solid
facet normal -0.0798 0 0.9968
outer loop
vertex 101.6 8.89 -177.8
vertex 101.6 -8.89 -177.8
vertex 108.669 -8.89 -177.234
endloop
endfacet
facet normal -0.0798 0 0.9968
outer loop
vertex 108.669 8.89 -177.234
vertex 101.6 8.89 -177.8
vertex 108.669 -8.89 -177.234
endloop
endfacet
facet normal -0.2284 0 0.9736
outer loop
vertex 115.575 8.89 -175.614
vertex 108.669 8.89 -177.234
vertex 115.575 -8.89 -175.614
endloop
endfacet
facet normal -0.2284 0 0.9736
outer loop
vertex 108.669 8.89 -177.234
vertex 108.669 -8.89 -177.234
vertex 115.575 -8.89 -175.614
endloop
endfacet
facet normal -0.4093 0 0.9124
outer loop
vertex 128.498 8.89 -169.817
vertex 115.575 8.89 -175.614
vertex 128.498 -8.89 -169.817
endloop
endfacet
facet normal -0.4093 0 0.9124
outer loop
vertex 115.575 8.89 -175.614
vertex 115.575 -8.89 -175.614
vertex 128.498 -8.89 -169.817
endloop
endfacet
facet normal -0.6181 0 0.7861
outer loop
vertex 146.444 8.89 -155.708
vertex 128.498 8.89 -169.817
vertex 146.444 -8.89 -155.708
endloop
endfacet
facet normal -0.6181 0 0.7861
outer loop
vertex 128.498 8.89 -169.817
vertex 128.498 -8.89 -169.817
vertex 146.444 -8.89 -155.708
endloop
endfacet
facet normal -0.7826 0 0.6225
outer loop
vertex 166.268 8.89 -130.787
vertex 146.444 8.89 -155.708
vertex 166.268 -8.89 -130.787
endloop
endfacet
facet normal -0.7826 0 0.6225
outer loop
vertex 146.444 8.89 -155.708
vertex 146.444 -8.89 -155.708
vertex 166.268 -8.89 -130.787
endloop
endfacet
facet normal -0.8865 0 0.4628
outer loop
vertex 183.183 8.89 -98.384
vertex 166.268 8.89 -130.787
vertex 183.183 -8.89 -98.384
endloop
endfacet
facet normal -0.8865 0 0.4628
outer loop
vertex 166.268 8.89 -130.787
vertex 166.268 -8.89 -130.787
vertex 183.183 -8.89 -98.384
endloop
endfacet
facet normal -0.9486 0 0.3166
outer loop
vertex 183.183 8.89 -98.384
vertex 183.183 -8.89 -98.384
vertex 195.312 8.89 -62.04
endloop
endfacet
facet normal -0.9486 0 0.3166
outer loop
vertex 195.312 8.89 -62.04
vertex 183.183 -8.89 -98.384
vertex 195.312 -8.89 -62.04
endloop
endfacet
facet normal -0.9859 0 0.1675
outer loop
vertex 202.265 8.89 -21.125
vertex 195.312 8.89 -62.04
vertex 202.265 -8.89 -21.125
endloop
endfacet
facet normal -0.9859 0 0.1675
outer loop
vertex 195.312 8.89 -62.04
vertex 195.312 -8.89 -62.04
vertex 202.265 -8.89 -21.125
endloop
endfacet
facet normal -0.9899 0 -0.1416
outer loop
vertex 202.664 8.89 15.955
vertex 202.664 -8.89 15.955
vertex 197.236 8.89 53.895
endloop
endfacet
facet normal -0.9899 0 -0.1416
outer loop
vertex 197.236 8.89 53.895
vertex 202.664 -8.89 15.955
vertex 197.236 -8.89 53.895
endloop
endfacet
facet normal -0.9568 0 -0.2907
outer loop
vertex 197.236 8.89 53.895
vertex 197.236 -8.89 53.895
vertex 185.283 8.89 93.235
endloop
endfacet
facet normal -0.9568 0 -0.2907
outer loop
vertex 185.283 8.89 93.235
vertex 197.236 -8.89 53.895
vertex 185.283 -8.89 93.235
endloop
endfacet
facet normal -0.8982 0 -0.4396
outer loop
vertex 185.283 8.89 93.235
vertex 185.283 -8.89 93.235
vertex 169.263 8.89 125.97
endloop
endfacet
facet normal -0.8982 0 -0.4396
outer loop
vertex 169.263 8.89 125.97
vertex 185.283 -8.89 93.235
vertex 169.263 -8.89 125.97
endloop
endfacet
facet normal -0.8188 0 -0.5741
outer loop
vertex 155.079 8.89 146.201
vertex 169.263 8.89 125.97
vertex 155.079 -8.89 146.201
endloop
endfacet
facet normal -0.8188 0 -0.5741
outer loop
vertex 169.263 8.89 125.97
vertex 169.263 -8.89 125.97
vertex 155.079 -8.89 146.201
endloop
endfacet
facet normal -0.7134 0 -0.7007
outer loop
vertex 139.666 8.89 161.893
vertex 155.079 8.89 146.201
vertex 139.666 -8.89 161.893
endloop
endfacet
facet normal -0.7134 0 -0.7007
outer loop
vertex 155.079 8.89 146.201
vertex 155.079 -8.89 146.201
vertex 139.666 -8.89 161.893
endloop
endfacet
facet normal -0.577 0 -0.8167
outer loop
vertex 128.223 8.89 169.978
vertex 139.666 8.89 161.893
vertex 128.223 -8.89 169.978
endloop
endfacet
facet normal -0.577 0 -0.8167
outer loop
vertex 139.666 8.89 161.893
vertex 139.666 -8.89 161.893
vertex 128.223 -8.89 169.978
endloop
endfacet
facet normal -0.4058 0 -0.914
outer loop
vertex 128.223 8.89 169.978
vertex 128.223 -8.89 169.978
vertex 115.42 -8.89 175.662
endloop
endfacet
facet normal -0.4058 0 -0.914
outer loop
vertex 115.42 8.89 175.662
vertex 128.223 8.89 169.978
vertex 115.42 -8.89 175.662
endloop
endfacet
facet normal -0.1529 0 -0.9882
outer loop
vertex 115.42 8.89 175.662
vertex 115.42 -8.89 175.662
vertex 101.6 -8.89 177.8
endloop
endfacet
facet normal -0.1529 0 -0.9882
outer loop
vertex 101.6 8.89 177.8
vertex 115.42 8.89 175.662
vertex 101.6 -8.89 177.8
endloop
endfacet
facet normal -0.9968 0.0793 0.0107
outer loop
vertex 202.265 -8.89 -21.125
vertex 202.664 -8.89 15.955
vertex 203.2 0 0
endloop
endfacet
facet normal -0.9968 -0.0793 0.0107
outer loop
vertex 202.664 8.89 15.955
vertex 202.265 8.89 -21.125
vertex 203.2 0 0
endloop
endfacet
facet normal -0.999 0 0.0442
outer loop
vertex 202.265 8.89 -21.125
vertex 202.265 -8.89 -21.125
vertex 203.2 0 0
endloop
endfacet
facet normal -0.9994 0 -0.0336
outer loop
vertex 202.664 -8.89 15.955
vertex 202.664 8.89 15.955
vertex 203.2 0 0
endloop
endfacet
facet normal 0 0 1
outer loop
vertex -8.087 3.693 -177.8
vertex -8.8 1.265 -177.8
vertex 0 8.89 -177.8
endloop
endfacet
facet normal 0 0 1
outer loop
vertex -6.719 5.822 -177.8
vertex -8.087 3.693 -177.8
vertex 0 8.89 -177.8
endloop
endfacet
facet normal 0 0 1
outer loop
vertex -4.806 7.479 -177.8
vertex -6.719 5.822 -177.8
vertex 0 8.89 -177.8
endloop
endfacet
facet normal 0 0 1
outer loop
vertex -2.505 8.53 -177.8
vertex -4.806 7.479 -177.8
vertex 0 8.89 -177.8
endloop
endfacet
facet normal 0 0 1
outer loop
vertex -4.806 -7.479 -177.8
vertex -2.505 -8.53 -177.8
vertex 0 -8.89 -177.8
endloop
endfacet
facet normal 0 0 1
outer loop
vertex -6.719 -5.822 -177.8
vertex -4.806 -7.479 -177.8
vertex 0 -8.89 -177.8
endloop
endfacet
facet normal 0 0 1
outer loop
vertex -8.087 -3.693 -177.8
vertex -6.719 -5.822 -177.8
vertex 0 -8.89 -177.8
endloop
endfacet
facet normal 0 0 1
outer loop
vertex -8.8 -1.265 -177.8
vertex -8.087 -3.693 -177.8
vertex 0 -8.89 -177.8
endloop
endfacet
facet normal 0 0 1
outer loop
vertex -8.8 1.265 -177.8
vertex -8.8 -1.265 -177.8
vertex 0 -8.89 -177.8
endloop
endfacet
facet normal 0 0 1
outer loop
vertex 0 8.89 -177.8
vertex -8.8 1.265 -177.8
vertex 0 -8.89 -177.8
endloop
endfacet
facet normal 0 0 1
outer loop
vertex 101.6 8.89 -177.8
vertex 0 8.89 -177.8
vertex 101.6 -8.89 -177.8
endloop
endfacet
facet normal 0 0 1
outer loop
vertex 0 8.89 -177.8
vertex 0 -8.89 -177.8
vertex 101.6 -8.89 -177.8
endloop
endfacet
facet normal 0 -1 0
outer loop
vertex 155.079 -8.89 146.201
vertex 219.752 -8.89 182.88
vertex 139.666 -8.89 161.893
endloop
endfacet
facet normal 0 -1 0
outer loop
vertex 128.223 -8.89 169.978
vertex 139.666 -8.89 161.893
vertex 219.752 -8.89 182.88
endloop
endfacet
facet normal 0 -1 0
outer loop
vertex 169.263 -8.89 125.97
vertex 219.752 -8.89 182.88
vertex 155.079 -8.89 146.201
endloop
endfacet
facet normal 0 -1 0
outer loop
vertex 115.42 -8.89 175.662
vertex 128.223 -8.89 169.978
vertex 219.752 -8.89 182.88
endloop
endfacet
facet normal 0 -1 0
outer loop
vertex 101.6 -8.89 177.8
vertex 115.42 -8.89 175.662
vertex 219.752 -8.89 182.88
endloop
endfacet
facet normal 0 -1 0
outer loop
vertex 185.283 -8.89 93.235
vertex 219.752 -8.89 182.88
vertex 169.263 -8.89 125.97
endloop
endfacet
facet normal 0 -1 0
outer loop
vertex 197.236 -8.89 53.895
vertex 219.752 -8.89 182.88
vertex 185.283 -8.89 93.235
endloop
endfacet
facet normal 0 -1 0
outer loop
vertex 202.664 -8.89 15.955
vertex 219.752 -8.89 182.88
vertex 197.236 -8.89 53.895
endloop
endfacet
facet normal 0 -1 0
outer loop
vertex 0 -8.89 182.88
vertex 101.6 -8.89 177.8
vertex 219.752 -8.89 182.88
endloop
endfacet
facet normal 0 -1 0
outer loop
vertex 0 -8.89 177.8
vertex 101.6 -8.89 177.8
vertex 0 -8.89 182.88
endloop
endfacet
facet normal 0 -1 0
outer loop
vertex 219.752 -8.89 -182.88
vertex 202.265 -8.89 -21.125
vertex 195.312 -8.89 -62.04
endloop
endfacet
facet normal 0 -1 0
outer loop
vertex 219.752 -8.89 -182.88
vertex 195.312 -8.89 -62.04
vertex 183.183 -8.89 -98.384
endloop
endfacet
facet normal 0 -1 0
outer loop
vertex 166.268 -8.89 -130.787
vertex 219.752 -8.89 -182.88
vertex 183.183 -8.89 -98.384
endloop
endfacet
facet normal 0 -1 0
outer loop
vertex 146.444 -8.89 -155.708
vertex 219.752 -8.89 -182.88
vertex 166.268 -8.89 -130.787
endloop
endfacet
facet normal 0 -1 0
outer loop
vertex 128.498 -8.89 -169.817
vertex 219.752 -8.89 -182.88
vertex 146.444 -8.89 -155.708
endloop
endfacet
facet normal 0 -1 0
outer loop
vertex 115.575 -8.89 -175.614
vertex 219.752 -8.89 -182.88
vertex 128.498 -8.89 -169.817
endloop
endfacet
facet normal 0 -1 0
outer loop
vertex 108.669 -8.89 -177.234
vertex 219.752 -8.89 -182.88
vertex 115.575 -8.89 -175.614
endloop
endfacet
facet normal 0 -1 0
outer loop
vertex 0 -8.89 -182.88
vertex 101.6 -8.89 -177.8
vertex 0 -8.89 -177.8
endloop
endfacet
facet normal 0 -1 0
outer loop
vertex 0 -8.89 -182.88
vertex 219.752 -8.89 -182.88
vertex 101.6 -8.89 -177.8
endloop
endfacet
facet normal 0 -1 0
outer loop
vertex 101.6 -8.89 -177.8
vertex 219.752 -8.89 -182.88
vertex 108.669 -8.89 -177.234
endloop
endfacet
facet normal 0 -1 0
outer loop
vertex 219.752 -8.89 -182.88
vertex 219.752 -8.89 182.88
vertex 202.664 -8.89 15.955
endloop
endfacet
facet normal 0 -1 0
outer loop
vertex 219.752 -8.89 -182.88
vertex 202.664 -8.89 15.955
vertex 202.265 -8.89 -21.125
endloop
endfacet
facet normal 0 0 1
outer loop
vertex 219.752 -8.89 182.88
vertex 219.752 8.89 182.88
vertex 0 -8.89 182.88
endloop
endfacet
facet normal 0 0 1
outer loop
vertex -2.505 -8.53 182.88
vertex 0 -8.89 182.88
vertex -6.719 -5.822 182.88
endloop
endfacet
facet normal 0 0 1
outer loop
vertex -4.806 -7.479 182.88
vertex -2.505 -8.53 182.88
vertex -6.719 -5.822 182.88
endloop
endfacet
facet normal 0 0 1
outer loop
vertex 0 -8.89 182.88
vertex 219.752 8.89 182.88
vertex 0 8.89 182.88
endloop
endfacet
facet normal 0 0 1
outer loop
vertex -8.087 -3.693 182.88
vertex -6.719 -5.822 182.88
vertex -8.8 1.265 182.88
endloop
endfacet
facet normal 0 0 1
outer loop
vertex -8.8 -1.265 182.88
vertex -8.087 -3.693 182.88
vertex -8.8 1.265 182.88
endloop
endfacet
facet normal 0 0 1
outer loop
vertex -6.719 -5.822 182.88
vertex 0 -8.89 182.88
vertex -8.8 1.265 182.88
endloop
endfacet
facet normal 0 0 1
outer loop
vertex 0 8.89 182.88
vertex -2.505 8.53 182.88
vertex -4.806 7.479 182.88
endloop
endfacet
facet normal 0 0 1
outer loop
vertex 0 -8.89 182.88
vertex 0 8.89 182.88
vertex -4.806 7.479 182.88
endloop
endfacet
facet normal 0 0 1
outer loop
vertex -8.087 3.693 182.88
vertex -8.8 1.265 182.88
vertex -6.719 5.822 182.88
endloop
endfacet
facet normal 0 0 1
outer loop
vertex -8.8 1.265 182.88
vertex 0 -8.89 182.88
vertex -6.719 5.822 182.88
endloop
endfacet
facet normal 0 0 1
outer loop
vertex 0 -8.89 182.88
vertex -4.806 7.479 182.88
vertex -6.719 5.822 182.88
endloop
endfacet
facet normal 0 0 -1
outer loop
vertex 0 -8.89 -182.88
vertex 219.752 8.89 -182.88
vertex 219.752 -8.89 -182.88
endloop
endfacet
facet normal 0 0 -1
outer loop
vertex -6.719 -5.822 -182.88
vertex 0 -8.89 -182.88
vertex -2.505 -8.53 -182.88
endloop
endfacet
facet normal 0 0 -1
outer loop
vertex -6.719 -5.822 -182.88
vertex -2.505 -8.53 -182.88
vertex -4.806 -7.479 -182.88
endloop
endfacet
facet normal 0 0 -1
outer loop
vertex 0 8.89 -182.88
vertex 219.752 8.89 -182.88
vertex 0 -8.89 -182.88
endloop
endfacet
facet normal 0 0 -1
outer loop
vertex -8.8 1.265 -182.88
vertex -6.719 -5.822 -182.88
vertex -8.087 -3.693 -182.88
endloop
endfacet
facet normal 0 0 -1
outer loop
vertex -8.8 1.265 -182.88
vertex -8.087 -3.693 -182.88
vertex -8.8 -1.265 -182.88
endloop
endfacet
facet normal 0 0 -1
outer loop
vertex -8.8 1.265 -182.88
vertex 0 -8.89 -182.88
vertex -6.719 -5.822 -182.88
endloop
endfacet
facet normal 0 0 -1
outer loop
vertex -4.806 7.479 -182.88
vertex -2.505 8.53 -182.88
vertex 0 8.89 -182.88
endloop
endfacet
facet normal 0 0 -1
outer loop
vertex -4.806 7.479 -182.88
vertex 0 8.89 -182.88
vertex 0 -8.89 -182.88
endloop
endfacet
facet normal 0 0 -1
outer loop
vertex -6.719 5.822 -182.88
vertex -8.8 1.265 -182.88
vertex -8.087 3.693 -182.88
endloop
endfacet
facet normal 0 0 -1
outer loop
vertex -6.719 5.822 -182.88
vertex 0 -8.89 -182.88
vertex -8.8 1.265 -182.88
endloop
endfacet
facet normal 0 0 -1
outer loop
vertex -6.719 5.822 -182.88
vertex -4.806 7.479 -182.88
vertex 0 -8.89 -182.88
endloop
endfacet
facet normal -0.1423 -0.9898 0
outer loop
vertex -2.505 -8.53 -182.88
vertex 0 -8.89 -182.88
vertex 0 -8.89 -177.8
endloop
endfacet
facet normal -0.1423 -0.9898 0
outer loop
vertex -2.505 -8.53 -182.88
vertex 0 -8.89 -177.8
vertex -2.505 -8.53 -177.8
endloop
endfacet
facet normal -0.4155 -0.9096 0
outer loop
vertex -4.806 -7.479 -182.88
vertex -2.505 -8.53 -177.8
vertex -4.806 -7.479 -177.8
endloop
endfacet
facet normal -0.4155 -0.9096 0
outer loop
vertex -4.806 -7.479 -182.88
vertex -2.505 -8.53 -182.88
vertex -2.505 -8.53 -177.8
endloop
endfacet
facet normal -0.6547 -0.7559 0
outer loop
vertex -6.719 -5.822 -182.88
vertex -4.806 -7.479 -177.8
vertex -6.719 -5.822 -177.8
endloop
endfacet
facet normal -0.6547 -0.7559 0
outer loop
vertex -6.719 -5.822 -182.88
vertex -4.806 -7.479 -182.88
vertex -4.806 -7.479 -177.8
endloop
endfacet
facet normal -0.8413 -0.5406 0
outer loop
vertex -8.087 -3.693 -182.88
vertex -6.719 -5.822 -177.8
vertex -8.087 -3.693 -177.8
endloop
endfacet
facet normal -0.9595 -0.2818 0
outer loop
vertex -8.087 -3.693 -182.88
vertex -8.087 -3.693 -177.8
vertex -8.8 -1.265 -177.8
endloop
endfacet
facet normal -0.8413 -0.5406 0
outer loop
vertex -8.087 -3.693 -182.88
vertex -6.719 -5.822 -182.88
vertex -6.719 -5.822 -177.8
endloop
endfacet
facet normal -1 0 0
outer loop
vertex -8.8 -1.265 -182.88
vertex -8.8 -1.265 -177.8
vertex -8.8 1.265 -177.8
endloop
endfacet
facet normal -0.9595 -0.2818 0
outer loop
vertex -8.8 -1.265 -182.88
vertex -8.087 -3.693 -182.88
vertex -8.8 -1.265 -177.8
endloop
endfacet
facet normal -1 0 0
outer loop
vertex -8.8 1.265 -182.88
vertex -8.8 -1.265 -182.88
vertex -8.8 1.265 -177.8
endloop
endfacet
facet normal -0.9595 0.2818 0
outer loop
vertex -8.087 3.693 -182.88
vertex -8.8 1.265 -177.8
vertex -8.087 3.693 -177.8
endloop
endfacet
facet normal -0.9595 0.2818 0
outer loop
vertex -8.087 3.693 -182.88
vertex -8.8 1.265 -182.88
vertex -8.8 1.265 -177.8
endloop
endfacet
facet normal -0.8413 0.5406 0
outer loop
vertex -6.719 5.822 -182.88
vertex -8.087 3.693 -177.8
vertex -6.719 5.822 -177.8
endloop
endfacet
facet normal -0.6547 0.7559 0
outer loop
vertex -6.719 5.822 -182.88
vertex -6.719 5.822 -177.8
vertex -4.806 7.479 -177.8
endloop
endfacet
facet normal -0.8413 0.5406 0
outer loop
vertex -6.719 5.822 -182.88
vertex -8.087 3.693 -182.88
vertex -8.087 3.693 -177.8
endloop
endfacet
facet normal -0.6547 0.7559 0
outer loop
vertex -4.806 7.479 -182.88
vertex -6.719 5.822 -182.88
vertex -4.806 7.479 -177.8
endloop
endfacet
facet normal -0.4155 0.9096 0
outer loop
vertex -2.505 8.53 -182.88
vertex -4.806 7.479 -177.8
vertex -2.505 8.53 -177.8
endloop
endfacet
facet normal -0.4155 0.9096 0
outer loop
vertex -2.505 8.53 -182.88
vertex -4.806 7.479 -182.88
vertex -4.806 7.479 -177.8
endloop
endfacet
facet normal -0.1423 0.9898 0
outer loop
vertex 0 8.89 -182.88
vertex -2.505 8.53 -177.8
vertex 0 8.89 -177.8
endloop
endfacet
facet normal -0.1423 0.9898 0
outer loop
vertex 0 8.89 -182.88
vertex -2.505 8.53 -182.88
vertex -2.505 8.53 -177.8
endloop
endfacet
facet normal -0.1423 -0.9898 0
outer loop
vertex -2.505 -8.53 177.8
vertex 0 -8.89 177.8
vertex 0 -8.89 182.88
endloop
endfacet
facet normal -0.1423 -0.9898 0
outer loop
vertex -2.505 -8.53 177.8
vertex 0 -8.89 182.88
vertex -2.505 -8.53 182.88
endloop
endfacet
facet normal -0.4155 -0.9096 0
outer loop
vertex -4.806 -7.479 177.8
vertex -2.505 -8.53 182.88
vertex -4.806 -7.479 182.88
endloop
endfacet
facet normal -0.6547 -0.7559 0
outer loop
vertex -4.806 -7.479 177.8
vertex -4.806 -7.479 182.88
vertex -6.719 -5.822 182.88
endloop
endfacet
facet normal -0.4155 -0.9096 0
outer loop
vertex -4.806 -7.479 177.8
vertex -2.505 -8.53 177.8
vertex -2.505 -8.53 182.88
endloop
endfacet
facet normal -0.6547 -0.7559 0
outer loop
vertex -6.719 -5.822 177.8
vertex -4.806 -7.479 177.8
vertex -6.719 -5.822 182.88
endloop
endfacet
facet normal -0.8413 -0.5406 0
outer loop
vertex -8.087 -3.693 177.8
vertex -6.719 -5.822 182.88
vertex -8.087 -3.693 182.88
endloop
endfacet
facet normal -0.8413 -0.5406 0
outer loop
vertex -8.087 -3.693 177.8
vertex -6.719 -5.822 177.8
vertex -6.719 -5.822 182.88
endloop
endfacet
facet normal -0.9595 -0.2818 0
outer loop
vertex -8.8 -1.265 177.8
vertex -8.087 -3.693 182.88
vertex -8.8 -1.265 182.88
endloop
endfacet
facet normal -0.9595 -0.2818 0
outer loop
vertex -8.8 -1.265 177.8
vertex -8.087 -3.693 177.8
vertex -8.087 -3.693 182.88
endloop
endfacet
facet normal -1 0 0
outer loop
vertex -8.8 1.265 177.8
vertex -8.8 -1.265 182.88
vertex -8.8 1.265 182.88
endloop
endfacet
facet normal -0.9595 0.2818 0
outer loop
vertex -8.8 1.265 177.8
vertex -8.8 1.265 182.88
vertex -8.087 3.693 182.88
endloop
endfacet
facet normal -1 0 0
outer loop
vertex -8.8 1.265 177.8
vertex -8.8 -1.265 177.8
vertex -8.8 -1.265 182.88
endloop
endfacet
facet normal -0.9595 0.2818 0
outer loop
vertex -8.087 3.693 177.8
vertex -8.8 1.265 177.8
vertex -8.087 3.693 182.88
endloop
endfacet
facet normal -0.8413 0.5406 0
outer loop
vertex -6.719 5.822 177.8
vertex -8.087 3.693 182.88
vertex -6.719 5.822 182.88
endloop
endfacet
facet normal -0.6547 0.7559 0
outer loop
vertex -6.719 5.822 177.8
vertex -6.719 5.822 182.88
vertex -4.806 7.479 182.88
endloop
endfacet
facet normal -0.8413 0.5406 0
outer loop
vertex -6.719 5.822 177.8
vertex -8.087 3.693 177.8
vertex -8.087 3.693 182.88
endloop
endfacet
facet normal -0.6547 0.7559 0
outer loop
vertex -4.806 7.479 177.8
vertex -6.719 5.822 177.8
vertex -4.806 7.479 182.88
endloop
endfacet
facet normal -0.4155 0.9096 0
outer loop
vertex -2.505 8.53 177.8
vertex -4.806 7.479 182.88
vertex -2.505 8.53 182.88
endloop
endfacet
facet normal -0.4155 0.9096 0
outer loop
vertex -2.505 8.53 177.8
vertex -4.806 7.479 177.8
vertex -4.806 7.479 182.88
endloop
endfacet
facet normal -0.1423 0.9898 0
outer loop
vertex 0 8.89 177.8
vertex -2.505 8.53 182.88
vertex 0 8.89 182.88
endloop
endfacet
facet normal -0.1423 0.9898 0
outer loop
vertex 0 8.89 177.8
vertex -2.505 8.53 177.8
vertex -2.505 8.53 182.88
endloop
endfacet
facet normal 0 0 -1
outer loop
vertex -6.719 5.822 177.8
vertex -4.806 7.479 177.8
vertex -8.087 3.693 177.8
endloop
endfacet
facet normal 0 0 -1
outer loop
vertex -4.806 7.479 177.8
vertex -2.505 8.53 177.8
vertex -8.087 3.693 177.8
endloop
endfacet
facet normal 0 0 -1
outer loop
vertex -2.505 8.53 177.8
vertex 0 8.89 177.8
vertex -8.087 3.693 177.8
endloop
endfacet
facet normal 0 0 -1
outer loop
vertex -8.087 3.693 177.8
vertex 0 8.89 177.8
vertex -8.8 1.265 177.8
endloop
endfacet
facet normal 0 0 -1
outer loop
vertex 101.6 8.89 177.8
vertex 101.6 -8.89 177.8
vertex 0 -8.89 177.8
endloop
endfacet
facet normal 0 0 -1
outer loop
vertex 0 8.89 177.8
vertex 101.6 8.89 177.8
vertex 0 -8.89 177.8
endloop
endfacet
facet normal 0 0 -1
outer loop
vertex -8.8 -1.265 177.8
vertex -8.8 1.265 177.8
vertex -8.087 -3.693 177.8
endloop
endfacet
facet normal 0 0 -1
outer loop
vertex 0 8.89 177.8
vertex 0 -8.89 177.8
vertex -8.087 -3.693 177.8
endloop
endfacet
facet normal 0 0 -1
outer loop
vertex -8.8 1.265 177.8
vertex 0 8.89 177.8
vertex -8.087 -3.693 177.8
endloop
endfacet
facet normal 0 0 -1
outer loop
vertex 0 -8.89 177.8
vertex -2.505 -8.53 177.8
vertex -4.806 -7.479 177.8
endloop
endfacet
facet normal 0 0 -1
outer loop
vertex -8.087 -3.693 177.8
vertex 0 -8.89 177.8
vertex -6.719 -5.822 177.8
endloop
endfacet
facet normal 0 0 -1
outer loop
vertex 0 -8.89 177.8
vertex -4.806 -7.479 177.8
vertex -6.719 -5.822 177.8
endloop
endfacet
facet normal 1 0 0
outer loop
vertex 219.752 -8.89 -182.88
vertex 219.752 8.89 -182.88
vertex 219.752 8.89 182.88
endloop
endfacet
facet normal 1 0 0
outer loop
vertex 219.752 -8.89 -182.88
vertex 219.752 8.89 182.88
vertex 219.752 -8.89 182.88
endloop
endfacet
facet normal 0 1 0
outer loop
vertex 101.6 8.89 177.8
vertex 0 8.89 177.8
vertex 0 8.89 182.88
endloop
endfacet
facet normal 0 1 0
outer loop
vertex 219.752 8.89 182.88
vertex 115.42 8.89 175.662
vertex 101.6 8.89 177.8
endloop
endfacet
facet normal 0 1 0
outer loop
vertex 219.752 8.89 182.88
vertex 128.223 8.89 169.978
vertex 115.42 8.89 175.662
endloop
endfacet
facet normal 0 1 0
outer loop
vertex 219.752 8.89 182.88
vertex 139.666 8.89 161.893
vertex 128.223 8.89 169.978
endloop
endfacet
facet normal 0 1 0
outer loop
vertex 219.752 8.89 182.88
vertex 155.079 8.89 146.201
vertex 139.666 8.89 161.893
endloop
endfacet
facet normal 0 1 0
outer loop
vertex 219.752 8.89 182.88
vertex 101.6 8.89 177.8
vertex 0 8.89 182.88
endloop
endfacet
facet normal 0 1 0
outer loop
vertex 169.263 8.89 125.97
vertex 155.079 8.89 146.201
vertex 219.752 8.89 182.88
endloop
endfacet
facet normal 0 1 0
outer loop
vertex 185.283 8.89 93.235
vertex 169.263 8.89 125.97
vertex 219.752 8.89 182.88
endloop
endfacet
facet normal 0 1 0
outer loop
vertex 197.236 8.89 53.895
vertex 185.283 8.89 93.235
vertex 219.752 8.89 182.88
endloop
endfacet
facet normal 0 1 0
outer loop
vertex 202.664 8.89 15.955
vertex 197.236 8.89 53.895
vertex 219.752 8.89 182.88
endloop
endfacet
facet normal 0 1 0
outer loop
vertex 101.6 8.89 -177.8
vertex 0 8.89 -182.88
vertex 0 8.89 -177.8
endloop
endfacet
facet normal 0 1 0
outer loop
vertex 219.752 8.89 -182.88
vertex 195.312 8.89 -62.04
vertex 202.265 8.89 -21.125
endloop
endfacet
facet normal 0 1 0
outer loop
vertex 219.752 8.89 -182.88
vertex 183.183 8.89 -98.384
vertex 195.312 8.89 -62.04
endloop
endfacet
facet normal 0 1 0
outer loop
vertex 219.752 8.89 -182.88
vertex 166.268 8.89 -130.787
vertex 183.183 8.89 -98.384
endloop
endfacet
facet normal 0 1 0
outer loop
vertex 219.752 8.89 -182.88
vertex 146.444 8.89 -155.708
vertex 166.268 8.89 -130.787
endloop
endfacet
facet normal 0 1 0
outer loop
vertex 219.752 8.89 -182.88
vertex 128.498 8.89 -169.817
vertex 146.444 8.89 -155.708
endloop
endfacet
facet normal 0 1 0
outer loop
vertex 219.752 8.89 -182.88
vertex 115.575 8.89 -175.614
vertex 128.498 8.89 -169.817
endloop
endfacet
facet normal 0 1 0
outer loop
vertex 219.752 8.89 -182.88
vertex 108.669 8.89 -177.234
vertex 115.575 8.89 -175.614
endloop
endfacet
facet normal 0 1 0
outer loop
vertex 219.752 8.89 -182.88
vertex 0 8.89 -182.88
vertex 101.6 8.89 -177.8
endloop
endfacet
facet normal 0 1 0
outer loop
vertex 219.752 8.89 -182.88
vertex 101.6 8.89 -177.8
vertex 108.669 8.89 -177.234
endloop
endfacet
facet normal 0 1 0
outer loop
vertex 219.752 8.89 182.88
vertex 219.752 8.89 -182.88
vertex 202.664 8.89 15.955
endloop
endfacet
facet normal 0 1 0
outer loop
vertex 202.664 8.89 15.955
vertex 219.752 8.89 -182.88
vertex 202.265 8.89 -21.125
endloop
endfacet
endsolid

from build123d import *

# Parameters (mm, degrees)
BOSS_EXTRUDE1_DEPTH      = 182.88
BOSS_EXTRUDE1_DEPTH_BACK = 182.88
CUT_EXTRUDE1_DEPTH       = 177.8
CUT_EXTRUDE1_DEPTH_BACK  = 177.8
SKETCH1_5_OUTSIDE_W      = 316.984
SKETCH1_5_OUTSIDE_H      = 106.122
SKETCH1_5_OUTSIDE_R      = 3.81
CUT_EXTRUDE2_DEPTH       = 287.032982605
CUT_EXTRUDE2_DEPTH_BACK  = 287.032982605


with BuildPart() as part:
    # Sketch1 → Boss-Extrude1 (new, two sides: drawn at the far end of the back side and taken through both)
    with BuildSketch(Plane.XY.offset(-BOSS_EXTRUDE1_DEPTH_BACK)):
        with BuildLine():
            Line((0, 8.89), (219.75154297, 8.89))
            Line((219.75154297, 8.89), (219.75154297, -8.89))
            Line((219.75154297, -8.89), (0, -8.89))
            ThreePointArc((0, -8.89), (-8.89, 0), (0, 8.89))
        make_face()
    extrude(amount=BOSS_EXTRUDE1_DEPTH + BOSS_EXTRUDE1_DEPTH_BACK)

    # Sketch1<5> outside → Cut-Extrude1 (cut, two sides: drawn at the far end of the back side and taken through both)
    # profile 1 of 2: a face of its own
    with BuildSketch(Plane.XY.offset(-CUT_EXTRUDE1_DEPTH_BACK)):
        with Locations((105.431, 0)):
            Rectangle(SKETCH1_5_OUTSIDE_W, SKETCH1_5_OUTSIDE_H)
        with BuildLine():
            Line((0, 8.89), (219.75154297, 8.89))
            Line((219.75154297, 8.89), (219.75154297, -8.89))
            Line((219.75154297, -8.89), (0, -8.89))
            ThreePointArc((0, -8.89), (-8.89, 0), (0, 8.89))
        make_face(mode=Mode.SUBTRACT)
    # profile 2 of 2: a face of its own
    with BuildSketch(Plane.XY.offset(-CUT_EXTRUDE1_DEPTH_BACK)):
        Circle(SKETCH1_5_OUTSIDE_R)
    extrude(amount=CUT_EXTRUDE1_DEPTH + CUT_EXTRUDE1_DEPTH_BACK, mode=Mode.SUBTRACT)

    # Sketch3 → Cut-Extrude2 (cut, two sides: drawn at the far end of the back side and taken through both)
    with BuildSketch(Plane(origin=(0, 0, 0), x_dir=(1, 0, 0), z_dir=(0, 1, 0)).offset(-CUT_EXTRUDE2_DEPTH_BACK)):
        with BuildLine():
            Line((-101.6, 177.8), (101.6, 177.8))
            add(Edge.make_bspline(
                [(101.6, 177.8), (152.4, 177.8), (254, 0), (152.4, -177.8), (101.6, -177.8)],
                knots=[0, 0, 0, 0, 0.5, 1, 1, 1, 1], degree=3))
            Line((101.6, -177.8), (-101.6, -177.8))
            Line((-101.6, -177.8), (-101.6, 177.8))
        make_face()
    extrude(amount=CUT_EXTRUDE2_DEPTH + CUT_EXTRUDE2_DEPTH_BACK, mode=Mode.SUBTRACT)


solid = part.part
